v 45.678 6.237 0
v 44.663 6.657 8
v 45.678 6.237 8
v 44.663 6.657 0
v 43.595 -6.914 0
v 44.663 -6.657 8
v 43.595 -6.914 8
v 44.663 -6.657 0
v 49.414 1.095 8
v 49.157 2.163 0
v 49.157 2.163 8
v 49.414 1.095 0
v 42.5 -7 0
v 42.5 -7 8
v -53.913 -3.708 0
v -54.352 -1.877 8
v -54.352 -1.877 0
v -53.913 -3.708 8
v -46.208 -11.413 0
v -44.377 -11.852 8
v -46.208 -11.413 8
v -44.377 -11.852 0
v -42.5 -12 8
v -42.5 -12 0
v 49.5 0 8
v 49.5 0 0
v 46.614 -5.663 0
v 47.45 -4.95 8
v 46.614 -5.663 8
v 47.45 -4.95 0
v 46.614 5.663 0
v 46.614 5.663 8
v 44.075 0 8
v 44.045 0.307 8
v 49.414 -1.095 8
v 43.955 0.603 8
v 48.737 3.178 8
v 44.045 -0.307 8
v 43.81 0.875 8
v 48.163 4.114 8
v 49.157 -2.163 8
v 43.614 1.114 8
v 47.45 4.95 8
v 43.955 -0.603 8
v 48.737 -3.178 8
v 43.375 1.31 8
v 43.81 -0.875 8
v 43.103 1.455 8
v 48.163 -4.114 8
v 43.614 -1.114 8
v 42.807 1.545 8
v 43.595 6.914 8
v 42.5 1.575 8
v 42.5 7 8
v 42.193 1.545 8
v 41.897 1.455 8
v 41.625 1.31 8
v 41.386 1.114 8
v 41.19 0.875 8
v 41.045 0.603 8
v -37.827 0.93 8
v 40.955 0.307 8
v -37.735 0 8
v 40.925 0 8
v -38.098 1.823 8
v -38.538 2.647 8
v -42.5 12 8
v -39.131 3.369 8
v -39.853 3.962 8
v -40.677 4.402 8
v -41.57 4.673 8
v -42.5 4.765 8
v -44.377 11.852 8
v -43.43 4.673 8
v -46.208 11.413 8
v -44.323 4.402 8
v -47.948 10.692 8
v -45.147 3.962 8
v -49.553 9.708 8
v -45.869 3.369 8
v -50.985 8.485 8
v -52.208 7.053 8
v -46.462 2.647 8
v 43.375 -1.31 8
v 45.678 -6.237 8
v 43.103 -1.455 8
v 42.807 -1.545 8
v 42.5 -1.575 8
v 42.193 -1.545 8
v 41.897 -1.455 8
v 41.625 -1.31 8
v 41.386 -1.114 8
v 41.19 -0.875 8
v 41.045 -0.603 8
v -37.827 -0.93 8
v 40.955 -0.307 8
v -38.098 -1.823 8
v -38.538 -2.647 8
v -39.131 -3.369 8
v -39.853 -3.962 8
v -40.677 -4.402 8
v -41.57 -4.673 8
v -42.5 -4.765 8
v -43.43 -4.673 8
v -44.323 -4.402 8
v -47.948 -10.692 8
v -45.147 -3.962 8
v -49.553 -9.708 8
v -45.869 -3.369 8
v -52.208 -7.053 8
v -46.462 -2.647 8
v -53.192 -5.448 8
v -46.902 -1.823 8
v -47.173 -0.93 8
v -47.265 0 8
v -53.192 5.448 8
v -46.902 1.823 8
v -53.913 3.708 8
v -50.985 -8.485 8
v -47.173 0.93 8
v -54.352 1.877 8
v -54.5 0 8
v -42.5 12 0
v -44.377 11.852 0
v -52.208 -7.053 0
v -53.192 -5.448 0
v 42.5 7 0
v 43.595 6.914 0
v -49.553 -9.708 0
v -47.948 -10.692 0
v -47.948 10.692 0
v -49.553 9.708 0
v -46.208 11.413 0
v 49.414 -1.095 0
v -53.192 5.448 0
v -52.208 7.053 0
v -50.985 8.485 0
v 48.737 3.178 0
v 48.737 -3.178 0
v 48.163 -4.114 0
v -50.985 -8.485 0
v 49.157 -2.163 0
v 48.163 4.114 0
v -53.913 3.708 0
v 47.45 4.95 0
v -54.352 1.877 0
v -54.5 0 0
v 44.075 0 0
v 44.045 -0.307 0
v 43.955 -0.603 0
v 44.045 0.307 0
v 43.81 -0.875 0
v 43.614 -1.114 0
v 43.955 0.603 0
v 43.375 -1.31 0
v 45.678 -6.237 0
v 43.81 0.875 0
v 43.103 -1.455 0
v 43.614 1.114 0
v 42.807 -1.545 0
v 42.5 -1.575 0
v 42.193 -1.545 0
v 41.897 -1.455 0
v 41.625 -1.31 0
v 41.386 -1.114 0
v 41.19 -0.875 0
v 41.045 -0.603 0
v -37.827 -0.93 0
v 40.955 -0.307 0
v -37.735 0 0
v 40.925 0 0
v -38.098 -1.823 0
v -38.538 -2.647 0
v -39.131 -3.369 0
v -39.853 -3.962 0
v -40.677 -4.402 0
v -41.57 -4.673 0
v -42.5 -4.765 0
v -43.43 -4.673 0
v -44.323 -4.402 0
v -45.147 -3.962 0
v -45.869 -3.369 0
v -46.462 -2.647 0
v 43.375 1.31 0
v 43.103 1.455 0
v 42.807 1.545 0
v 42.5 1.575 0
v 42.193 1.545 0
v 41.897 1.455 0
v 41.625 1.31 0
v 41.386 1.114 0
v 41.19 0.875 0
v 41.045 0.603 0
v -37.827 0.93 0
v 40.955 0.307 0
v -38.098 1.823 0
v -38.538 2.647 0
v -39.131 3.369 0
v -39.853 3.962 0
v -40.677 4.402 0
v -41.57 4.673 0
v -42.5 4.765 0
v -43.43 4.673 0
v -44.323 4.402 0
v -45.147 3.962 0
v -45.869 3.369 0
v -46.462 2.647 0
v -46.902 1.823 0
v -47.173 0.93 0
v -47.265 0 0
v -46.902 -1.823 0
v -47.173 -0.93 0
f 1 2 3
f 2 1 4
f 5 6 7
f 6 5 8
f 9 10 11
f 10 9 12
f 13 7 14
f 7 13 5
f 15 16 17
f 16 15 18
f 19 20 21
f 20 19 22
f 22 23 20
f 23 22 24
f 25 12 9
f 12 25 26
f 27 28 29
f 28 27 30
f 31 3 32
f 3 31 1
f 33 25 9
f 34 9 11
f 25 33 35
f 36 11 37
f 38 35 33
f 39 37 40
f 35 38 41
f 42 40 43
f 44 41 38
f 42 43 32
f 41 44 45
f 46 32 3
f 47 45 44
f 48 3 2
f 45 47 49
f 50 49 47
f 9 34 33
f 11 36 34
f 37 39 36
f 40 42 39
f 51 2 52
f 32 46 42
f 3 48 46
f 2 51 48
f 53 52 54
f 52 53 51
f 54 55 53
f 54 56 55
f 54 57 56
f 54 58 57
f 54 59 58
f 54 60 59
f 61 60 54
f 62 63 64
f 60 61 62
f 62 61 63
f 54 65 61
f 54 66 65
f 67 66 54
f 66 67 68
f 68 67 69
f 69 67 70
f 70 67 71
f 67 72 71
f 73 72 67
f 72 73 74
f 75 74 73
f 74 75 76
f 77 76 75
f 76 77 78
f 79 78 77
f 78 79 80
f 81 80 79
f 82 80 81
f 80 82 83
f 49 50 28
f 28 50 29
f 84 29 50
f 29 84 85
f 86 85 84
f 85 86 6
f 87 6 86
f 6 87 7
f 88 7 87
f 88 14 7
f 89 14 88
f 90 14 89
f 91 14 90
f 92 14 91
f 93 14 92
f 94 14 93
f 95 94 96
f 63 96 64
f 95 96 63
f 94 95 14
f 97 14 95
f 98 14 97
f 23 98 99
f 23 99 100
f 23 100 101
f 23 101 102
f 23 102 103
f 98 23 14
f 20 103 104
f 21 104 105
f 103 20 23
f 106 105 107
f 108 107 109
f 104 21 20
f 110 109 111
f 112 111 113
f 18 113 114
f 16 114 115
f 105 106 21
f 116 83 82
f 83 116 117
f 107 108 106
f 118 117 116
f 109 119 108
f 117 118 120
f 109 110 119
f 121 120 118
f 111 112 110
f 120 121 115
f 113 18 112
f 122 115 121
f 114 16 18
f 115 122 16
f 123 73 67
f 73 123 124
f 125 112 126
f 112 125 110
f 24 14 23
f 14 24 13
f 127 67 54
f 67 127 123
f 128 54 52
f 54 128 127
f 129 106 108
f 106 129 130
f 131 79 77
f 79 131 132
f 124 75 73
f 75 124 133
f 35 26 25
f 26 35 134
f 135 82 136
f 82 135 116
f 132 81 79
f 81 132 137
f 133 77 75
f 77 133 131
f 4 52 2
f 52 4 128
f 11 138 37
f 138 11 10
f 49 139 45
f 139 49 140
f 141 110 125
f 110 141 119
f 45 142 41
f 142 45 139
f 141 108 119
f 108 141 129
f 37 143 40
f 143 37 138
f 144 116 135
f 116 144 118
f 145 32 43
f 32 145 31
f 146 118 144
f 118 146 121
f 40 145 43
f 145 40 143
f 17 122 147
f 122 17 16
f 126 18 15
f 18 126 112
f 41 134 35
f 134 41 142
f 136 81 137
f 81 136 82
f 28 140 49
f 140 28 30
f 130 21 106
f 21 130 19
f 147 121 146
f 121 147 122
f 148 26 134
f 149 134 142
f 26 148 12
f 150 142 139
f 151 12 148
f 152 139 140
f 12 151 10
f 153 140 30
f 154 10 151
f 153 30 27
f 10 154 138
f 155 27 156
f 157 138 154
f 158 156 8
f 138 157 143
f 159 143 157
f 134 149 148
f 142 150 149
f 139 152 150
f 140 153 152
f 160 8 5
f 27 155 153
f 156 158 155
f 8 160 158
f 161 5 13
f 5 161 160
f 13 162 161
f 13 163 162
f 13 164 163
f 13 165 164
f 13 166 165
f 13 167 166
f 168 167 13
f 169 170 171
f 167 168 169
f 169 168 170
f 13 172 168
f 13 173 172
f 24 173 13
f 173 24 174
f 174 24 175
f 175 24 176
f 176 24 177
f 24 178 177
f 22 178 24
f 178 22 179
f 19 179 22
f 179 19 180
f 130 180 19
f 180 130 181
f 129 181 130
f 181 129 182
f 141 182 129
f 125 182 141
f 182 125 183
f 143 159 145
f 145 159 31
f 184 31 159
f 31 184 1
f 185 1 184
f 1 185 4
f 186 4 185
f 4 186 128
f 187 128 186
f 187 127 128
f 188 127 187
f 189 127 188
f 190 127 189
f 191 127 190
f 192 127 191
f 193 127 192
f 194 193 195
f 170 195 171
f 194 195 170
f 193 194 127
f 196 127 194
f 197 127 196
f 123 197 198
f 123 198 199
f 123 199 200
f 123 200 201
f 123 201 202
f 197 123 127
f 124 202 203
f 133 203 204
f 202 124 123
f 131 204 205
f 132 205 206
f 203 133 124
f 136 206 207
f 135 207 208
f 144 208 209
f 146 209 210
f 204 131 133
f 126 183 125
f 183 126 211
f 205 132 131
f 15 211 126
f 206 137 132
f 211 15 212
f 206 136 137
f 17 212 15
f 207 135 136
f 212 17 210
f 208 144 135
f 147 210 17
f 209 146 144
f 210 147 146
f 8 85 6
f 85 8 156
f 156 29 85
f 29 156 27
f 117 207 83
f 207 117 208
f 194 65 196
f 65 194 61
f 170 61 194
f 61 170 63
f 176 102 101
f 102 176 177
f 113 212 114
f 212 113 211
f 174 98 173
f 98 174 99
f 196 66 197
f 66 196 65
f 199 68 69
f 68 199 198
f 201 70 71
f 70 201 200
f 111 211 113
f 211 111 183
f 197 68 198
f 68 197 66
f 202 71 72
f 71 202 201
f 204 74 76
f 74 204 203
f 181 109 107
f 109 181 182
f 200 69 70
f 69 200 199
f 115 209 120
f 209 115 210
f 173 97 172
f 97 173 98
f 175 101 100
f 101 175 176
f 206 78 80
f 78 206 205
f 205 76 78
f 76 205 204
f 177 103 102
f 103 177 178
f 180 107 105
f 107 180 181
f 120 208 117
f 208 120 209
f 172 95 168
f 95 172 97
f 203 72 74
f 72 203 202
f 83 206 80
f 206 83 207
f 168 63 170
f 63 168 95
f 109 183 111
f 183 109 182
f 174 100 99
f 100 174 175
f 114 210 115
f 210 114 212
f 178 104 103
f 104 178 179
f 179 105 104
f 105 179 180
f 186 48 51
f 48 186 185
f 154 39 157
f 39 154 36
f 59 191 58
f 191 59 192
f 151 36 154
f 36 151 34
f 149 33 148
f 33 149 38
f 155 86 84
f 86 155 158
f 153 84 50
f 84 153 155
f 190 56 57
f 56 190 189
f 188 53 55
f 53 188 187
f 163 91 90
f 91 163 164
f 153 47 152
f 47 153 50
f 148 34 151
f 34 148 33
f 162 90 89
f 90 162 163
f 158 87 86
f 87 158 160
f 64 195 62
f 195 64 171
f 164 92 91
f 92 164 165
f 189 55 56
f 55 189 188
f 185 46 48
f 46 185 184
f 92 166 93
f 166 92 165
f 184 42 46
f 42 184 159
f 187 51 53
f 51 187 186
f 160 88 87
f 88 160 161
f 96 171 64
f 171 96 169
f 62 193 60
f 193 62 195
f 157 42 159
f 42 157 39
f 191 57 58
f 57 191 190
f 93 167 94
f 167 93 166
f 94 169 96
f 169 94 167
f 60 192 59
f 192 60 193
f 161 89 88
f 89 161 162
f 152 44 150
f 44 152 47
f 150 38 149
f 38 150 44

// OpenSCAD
$fn = 32;

// ----------------------------------------------------------------------
// Lever: 85 mm between the bosses, 8 mm thick, smooth outline
// ----------------------------------------------------------------------

// --- parameters (mm) ---
lever_l = 85;             // distance between the boss centres
boss_a = 24;              // first boss diameter
boss_b = 14;              // second boss diameter
bore_a = 9.53;            // first bore
bore_b = 3.15;            // second bore
lever_t = 8;              // lever thickness

lever_profile = [[-54.5, 0], [-54.352, -1.877], [-53.913, -3.708], [-53.192, -5.448], [-52.208, -7.053], [-50.985, -8.485], [-49.553, -9.708], [-47.948, -10.692], [-46.208, -11.413], [-44.377, -11.852], [-42.5, -12], [42.5, -7], [43.595, -6.914], [44.663, -6.657], [45.678, -6.237], [46.614, -5.663], [47.45, -4.95], [48.163, -4.114], [48.737, -3.178], [49.157, -2.163], [49.414, -1.095], [49.5, 0], [49.414, 1.095], [49.157, 2.163], [48.737, 3.178], [48.163, 4.114], [47.45, 4.95], [46.614, 5.663], [45.678, 6.237], [44.663, 6.657], [43.595, 6.914], [42.5, 7], [-42.5, 12], [-44.377, 11.852], [-46.208, 11.413], [-47.948, 10.692], [-49.553, 9.708], [-50.985, 8.485], [-52.208, 7.053], [-53.192, 5.448], [-53.913, 3.708], [-54.352, 1.877]];

difference() {
  linear_extrude(height = lever_t) polygon(lever_profile);
  translate([-42.5, 0, -2.5]) cylinder(h = lever_t + 5, d = bore_a);
  translate([42.5, 0, -2.5]) cylinder(h = lever_t + 5, d = bore_b);
}
